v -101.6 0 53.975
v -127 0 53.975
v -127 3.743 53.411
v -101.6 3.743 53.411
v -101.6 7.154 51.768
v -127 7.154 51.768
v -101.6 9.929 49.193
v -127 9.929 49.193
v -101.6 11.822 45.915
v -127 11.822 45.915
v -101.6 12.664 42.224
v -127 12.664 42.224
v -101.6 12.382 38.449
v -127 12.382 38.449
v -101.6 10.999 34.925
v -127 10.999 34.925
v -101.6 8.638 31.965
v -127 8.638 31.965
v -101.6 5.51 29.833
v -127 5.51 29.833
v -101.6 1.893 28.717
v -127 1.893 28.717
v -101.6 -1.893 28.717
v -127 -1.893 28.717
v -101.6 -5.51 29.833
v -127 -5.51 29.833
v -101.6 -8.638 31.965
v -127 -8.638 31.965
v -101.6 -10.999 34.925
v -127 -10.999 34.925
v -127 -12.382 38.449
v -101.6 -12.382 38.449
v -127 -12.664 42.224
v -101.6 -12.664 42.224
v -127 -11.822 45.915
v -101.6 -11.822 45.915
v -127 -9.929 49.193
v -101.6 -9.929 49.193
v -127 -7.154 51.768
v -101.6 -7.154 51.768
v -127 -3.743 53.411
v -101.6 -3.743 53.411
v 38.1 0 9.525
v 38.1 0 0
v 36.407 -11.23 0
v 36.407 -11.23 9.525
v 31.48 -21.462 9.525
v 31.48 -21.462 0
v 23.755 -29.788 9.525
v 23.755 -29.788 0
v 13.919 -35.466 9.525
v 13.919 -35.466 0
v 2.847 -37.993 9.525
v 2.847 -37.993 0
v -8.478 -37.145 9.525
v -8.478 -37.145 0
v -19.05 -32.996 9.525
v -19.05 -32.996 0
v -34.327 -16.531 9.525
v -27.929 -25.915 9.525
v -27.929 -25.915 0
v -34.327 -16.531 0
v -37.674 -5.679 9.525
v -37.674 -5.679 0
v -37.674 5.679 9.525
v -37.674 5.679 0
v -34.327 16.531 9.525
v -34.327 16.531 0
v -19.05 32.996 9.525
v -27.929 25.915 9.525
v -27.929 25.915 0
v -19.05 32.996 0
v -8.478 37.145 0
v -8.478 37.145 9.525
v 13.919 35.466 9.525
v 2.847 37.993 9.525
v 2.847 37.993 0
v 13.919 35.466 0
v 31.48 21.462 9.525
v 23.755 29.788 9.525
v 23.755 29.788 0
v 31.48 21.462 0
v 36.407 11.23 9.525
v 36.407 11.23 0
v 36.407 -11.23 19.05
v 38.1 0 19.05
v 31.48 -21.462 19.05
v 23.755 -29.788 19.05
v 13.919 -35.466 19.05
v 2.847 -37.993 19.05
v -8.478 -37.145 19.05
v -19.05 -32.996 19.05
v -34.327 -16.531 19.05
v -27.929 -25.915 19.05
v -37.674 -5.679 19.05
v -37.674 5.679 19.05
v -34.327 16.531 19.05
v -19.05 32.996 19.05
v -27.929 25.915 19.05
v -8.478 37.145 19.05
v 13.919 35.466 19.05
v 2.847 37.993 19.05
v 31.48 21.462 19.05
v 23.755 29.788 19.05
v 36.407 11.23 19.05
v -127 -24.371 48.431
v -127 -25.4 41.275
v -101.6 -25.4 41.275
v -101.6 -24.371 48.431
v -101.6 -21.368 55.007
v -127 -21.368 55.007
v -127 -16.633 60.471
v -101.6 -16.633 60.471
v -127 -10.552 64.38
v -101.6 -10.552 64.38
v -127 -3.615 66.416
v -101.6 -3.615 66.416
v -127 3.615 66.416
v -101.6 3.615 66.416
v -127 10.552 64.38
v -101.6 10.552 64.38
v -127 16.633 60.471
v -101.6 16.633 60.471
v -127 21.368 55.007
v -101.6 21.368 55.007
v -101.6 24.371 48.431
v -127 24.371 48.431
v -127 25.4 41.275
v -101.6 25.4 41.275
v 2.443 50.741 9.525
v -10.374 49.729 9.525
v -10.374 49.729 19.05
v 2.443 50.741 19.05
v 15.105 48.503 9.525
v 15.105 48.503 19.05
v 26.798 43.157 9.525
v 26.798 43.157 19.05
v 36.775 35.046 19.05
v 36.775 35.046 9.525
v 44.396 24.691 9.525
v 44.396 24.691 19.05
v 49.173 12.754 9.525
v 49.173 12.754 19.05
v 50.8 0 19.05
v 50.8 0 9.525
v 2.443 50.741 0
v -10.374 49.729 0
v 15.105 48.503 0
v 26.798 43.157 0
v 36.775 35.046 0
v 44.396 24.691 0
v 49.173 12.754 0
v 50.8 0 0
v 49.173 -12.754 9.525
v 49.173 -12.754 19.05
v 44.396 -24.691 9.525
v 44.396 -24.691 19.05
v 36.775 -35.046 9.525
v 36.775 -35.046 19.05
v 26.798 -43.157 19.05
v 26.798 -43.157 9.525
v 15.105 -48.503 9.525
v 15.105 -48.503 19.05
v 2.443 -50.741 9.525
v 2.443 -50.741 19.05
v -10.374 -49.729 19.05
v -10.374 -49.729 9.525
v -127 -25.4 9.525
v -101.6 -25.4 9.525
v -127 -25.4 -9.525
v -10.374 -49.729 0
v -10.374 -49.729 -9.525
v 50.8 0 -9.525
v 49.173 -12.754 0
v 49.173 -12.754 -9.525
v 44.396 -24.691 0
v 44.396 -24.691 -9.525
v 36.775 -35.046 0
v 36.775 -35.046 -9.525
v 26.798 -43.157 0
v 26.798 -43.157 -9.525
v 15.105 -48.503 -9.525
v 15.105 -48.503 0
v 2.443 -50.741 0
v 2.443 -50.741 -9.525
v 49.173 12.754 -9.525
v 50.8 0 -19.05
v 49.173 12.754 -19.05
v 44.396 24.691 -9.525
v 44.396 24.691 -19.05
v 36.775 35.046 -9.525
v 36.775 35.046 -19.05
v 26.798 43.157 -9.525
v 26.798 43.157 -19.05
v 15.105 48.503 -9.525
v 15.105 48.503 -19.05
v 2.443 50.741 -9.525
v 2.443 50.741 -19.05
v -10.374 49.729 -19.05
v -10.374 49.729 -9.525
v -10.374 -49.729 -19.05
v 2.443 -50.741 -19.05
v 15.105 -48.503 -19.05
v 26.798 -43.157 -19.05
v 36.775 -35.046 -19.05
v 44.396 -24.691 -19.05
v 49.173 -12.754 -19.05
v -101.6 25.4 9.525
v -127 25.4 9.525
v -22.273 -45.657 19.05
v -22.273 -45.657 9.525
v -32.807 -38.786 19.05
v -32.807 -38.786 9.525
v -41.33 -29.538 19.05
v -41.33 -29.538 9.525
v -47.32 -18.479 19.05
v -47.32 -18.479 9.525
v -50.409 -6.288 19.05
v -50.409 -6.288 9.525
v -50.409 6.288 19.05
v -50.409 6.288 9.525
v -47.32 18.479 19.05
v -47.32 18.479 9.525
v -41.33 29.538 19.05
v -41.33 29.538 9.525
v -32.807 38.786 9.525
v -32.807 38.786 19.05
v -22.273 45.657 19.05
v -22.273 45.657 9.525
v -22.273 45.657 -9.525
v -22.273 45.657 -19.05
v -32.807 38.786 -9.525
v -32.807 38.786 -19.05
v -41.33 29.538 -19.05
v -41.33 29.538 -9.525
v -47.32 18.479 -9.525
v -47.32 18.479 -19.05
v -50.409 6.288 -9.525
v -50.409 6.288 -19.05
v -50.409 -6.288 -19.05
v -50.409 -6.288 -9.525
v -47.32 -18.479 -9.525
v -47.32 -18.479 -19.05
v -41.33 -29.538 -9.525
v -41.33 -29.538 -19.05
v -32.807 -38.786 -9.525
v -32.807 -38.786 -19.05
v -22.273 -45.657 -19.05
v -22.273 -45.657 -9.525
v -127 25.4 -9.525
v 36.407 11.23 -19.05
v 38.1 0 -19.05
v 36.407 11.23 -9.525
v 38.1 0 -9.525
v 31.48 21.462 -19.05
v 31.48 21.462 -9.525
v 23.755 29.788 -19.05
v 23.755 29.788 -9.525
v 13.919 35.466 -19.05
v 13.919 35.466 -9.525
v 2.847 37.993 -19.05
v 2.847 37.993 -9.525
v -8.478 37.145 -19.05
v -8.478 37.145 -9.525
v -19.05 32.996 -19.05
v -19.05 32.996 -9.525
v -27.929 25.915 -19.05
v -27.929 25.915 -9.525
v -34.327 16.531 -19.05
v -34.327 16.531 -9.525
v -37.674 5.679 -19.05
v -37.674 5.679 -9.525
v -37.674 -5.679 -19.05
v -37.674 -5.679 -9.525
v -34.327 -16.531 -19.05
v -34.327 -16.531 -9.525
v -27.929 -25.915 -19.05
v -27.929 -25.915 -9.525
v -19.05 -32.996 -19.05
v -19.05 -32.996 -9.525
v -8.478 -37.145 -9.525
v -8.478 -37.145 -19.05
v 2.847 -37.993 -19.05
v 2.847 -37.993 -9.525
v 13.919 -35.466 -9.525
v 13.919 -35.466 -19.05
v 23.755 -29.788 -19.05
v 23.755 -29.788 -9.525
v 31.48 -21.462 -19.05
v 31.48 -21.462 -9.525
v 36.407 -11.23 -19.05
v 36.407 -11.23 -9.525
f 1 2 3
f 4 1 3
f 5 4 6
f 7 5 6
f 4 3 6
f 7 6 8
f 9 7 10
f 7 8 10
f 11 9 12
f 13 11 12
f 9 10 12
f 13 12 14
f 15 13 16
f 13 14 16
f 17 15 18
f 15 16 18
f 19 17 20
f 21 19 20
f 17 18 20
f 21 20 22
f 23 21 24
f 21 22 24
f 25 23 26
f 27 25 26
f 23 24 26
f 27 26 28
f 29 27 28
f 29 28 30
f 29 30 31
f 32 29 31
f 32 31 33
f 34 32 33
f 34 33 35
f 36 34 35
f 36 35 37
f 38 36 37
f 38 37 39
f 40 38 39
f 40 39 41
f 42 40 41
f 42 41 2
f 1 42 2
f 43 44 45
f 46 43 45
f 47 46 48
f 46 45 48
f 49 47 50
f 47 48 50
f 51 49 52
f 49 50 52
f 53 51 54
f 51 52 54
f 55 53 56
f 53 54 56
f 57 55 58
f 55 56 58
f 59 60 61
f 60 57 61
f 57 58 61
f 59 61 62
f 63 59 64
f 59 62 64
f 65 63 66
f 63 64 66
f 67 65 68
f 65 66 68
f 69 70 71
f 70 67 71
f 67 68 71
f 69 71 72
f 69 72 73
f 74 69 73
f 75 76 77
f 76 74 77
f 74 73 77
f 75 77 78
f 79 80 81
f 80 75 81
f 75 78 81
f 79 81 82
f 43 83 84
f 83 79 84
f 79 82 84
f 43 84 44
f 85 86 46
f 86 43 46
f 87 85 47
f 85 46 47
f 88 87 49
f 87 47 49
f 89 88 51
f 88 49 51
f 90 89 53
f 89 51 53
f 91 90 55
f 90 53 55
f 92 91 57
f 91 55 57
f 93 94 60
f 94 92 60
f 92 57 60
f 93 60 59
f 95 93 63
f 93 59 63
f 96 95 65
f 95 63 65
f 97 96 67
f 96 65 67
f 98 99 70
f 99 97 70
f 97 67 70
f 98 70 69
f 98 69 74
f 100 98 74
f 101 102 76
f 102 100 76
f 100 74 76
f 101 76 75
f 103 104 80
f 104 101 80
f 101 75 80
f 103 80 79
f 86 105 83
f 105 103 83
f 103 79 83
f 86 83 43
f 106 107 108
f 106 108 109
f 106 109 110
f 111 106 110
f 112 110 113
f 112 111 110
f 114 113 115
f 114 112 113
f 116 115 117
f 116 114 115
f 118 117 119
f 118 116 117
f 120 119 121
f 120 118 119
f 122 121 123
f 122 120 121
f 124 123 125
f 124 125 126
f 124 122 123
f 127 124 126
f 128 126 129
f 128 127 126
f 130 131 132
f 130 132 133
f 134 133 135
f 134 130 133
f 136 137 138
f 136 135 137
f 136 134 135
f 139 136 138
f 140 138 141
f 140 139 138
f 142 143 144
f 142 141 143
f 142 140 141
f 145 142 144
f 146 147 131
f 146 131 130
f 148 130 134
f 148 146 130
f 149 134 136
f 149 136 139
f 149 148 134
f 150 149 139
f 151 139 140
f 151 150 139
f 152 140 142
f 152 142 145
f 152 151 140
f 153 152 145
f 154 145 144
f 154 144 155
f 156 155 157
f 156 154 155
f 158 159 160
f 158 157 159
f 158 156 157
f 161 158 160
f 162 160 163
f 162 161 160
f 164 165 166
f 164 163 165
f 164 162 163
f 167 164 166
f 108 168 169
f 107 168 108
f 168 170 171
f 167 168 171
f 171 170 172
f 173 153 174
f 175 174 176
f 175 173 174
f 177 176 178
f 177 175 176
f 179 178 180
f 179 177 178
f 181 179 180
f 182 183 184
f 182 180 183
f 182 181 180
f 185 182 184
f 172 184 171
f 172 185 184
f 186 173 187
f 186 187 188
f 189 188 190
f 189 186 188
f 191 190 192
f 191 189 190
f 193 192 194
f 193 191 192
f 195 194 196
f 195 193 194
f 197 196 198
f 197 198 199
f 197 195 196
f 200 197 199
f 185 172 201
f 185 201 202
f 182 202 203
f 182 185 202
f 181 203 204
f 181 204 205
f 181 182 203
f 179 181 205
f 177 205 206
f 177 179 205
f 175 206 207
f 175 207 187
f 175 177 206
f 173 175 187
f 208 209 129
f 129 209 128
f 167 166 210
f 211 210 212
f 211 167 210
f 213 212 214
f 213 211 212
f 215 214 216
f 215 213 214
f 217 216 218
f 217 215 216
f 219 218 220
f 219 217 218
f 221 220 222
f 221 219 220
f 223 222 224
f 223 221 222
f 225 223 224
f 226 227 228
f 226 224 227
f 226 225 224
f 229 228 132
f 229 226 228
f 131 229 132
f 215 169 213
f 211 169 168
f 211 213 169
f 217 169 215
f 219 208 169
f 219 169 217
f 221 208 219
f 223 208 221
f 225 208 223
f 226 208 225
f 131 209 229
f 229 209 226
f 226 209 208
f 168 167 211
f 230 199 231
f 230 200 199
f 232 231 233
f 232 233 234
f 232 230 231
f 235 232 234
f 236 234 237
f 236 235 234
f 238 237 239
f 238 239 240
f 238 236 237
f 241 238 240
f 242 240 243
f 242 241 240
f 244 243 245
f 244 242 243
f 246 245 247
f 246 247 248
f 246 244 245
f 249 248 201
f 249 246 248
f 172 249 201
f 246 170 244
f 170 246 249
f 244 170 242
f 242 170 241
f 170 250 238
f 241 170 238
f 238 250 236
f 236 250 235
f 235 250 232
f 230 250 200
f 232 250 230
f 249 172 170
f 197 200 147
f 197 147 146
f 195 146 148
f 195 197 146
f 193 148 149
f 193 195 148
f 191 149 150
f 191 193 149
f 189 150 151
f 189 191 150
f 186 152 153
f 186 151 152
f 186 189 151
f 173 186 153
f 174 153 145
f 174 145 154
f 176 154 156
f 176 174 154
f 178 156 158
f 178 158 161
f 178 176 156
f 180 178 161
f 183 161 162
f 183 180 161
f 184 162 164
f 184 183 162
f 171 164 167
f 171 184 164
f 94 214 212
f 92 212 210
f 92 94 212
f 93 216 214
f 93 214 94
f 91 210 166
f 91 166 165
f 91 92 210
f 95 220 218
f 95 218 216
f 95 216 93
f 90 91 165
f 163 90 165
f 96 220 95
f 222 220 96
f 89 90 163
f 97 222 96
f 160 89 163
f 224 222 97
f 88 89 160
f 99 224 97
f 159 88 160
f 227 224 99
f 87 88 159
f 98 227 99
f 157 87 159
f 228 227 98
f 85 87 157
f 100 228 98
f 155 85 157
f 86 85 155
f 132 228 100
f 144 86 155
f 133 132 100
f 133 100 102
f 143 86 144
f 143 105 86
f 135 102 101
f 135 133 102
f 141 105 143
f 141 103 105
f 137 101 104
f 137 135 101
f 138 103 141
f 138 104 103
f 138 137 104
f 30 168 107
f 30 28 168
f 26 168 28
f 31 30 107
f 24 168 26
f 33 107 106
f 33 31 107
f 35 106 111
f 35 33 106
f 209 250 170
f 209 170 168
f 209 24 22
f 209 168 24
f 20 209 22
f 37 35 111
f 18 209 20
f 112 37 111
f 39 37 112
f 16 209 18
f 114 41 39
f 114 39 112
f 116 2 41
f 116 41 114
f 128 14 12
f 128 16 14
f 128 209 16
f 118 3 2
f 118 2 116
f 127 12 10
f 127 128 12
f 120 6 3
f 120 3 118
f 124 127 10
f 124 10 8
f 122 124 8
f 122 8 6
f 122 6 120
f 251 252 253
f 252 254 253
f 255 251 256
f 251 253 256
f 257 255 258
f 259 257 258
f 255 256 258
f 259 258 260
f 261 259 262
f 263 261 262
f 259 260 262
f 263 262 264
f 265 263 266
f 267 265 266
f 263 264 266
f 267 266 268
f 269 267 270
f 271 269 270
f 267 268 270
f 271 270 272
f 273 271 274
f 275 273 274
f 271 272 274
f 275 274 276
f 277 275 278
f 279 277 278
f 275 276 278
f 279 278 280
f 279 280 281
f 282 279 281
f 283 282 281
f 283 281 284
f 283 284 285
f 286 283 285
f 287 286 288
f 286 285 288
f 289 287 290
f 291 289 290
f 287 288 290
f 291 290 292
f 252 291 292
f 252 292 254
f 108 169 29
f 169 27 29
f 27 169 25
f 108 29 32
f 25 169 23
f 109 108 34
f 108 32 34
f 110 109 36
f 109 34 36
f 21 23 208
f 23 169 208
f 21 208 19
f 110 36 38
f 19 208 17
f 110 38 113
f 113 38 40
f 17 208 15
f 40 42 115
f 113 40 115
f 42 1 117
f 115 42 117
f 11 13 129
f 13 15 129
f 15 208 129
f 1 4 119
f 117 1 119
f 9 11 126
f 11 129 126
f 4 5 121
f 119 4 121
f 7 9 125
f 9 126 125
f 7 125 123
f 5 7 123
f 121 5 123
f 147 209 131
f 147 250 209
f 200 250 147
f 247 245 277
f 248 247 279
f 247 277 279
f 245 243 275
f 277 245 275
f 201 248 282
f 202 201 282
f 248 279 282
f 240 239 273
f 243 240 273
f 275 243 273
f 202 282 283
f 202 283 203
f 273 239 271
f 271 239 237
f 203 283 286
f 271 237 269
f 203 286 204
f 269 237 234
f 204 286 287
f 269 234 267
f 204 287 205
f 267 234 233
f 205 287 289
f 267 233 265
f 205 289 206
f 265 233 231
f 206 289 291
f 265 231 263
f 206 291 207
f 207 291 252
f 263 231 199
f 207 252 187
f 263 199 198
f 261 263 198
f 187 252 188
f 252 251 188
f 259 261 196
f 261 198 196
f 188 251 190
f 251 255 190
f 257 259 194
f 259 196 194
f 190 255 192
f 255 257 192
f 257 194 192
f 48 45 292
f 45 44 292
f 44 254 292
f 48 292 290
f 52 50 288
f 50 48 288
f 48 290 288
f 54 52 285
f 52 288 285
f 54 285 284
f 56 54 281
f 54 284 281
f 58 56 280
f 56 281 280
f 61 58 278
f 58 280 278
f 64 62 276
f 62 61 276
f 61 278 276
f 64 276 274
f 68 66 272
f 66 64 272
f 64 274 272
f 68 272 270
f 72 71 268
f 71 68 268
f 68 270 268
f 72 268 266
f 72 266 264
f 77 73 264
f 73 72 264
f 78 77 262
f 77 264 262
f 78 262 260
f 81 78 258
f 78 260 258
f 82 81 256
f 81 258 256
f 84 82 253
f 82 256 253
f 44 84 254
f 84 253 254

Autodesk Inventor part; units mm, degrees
ref_plane "YZ Plane" through (0, 0, 0) normal (1, 0, 0) x (0, 1, 0)
ref_plane "XZ Plane" through (0, 0, 0) normal (0, 1, 0) x (-1, 0, 0)
ref_plane "XY Plane" through (0, 0, 0) normal (0, 0, 1) x (1, 0, 0)
sketch "Sketch1" plane through (0, 0, 0) normal (0, 0, 1) x (1, 0, 0)
  circle A0 centre (0, 0) radius 38.1
  circle A1 centre (0, 0) radius 50.8
  line L0 (-127, 25.4) -> (-127, -25.4)
  line L1 (-127, 25.4) -> (-10.3741, 49.7294)
  line L2 (-127, -25.4) -> (-10.3741, -49.7294)
  dimension "d5" = 76.2
  dimension "d6" = 101.6
  dimension "d7" = 50.8
  dimension "d8" = 127
  dimension "d9" = 25.4
extrude "Extrusion1" add sketch "Sketch1" along normal mid plane 19.05
extrude "Extrusion2" add sketch "Sketch1" along normal mid plane 38.1 contours A1
sketch "Sketch3" plane through (-127, -25.4, 9.525) normal (-1, 0, 0) x (0, 0, 1)
  line L0 (0, 50.8) -> (31.75, 50.8)
  line L1 (0, 0) -> (31.75, 0)
  arc A0 (31.75, 0) -> (31.75, 50.8) centre (31.75, 25.4) ccw
  line L2 (-19.05, 0) -> (-19.05, 50.8) projected
  circle A1 centre (31.75, 25.4) radius 12.7
  line L3 (0, 50.8) -> (0, 0)
  line L4 (0, 50.8) -> (-19.05, 50.8) projected
  point P0 (-9.525, 25.4)
  dimension "d14" = 25.4
  dimension "d15" = 50.8
  dimension "d16" = 25.4
extrude "Extrusion3" add sketch "Sketch3" against normal blind 25.4
properties part number "HW 7 Part 4" material "Aluminum 6061"
